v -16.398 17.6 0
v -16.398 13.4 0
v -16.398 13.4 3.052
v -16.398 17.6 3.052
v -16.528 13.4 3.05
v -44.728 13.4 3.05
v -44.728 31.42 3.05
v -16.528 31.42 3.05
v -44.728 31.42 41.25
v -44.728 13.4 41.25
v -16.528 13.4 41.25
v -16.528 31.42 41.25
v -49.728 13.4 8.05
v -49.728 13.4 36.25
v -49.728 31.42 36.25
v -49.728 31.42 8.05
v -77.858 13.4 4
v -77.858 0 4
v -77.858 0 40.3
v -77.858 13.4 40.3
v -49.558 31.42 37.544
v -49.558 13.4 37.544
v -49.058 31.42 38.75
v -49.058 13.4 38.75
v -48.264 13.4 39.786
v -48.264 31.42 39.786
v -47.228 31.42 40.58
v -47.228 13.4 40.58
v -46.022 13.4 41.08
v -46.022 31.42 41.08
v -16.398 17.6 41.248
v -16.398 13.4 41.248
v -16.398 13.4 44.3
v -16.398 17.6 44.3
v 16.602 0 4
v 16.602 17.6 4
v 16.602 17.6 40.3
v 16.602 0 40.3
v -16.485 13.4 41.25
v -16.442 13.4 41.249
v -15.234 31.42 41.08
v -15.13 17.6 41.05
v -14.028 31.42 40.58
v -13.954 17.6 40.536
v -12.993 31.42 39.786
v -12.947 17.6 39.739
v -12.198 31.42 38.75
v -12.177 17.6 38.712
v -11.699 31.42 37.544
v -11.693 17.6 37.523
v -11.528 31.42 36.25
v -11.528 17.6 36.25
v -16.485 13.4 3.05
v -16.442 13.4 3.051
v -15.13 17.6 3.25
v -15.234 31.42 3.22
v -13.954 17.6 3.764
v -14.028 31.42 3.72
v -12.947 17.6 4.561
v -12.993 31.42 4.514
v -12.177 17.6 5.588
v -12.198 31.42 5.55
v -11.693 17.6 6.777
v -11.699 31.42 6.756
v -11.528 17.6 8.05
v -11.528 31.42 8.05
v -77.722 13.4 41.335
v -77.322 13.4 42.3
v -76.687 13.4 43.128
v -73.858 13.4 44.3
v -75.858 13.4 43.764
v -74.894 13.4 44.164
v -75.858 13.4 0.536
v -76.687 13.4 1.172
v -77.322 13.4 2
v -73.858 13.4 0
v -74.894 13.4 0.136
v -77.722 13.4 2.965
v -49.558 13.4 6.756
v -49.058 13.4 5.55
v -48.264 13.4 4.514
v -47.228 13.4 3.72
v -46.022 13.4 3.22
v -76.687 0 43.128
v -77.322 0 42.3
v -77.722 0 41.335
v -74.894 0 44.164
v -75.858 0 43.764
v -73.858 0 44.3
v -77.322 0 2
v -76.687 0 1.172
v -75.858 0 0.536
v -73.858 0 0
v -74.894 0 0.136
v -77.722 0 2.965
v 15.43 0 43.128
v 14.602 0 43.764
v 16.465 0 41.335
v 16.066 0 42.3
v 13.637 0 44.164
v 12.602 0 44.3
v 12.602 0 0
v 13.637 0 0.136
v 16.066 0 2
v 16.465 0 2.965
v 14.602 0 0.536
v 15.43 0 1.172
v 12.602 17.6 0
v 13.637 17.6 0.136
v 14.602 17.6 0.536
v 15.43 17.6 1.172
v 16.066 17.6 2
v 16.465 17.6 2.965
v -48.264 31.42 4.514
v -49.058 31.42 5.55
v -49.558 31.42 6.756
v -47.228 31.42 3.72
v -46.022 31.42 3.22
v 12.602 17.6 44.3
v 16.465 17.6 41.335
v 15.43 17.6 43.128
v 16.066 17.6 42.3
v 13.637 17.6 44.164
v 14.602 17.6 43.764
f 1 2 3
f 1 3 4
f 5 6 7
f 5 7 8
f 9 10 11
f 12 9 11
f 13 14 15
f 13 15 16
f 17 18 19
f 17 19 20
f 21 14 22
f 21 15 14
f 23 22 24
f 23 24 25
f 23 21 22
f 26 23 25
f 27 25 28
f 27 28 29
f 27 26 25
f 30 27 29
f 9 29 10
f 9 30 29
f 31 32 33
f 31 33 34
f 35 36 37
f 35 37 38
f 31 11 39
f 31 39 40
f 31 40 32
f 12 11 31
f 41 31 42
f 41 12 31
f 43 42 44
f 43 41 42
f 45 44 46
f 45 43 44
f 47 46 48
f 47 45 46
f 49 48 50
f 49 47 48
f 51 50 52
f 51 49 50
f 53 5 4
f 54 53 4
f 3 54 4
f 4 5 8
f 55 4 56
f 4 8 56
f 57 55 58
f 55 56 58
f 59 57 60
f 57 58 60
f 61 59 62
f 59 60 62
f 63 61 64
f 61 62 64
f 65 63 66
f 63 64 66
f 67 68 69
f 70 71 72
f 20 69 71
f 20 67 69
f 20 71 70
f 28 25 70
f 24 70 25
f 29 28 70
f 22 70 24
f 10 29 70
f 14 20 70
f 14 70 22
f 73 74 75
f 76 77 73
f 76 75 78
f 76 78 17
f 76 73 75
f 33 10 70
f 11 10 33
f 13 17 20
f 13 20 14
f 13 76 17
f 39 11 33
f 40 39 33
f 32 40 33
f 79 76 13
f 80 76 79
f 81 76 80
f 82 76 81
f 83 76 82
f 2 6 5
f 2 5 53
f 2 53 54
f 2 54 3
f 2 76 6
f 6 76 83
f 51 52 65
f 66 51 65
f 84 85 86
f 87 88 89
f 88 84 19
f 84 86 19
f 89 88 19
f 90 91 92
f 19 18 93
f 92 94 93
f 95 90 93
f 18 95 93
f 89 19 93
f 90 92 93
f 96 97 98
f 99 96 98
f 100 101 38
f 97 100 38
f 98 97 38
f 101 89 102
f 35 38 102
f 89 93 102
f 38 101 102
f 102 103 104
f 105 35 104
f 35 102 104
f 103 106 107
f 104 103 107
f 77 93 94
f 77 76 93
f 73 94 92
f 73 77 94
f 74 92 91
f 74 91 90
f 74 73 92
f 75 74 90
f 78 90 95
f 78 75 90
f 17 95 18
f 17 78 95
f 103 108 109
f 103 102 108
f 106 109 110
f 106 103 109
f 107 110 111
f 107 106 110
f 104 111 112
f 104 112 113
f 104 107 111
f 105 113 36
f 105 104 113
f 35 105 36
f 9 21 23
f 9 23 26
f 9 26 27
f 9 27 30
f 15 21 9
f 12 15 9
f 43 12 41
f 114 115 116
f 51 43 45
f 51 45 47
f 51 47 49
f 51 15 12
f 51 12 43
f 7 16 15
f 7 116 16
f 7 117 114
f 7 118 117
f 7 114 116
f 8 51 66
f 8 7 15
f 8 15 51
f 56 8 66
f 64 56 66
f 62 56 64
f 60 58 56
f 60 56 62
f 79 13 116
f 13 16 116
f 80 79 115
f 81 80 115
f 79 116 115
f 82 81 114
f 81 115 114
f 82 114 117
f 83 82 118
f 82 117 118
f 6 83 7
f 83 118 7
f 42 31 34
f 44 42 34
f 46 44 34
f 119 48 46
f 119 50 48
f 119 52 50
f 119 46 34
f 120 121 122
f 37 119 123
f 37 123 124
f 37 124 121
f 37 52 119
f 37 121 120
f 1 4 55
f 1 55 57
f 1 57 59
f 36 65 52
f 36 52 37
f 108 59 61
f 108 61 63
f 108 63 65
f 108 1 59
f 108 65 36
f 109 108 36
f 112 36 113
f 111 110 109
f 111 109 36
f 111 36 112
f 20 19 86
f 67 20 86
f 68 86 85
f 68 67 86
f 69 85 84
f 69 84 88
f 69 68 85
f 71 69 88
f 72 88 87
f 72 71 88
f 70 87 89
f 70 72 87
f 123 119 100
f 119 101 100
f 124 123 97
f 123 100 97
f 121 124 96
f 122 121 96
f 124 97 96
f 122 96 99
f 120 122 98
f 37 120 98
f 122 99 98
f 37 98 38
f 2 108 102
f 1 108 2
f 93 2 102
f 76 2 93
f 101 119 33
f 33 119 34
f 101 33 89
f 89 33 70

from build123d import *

# Parameters (mm, degrees)
BOSS_EXTRUDE1_DEPTH = 44.3
SKETCH2_W           = 38.2
SKETCH2_H           = 38.2
BOSS_EXTRUDE2_DEPTH = 18.02
FILLET1_R           = 5
FILLET2_R           = 4


with BuildPart() as part:
    # Sketch1 → Boss-Extrude1 (new body)
    with BuildSketch(Plane.XY):
        Polygon((0, 0), (-77.858285242, 0), (-77.858285242, 13.4), (-16.398285242, 13.4), (-16.398285242, 17.6), (16.601714758, 17.6), (16.601714758, 0), align=None)
    extrude(amount=BOSS_EXTRUDE1_DEPTH)

    # Sketch2 → Boss-Extrude2 (add)
    with BuildSketch(Plane(origin=(0, 13.4, 0), x_dir=(1, 0, 0), z_dir=(0, 1, 0))):
        with Locations((-30.628285242, -22.15)):
            Rectangle(SKETCH2_W, SKETCH2_H)
    extrude(amount=BOSS_EXTRUDE2_DEPTH)

    # Fillet1
    fillet1_edges = [part.edges().sort_by_distance(p)[0] for p in [
        (-49.728285242, 22.41, 3.05),
        (-11.528285242, 24.51, 3.05),
        (-11.528285242, 24.51, 41.25),
        (-49.728285242, 22.41, 41.25),
    ]]
    fillet(fillet1_edges, radius=FILLET1_R)

    # Fillet2
    fillet2_edges = [part.edges().sort_by_distance(p)[0] for p in [
        (-77.858285242, 6.7, 44.3),
        (-77.858285242, 6.7, 0),
        (16.601714758, 8.8, 44.3),
        (16.601714758, 8.8, 0),
    ]]
    fillet(fillet2_edges, radius=FILLET2_R)


solid = part.part
